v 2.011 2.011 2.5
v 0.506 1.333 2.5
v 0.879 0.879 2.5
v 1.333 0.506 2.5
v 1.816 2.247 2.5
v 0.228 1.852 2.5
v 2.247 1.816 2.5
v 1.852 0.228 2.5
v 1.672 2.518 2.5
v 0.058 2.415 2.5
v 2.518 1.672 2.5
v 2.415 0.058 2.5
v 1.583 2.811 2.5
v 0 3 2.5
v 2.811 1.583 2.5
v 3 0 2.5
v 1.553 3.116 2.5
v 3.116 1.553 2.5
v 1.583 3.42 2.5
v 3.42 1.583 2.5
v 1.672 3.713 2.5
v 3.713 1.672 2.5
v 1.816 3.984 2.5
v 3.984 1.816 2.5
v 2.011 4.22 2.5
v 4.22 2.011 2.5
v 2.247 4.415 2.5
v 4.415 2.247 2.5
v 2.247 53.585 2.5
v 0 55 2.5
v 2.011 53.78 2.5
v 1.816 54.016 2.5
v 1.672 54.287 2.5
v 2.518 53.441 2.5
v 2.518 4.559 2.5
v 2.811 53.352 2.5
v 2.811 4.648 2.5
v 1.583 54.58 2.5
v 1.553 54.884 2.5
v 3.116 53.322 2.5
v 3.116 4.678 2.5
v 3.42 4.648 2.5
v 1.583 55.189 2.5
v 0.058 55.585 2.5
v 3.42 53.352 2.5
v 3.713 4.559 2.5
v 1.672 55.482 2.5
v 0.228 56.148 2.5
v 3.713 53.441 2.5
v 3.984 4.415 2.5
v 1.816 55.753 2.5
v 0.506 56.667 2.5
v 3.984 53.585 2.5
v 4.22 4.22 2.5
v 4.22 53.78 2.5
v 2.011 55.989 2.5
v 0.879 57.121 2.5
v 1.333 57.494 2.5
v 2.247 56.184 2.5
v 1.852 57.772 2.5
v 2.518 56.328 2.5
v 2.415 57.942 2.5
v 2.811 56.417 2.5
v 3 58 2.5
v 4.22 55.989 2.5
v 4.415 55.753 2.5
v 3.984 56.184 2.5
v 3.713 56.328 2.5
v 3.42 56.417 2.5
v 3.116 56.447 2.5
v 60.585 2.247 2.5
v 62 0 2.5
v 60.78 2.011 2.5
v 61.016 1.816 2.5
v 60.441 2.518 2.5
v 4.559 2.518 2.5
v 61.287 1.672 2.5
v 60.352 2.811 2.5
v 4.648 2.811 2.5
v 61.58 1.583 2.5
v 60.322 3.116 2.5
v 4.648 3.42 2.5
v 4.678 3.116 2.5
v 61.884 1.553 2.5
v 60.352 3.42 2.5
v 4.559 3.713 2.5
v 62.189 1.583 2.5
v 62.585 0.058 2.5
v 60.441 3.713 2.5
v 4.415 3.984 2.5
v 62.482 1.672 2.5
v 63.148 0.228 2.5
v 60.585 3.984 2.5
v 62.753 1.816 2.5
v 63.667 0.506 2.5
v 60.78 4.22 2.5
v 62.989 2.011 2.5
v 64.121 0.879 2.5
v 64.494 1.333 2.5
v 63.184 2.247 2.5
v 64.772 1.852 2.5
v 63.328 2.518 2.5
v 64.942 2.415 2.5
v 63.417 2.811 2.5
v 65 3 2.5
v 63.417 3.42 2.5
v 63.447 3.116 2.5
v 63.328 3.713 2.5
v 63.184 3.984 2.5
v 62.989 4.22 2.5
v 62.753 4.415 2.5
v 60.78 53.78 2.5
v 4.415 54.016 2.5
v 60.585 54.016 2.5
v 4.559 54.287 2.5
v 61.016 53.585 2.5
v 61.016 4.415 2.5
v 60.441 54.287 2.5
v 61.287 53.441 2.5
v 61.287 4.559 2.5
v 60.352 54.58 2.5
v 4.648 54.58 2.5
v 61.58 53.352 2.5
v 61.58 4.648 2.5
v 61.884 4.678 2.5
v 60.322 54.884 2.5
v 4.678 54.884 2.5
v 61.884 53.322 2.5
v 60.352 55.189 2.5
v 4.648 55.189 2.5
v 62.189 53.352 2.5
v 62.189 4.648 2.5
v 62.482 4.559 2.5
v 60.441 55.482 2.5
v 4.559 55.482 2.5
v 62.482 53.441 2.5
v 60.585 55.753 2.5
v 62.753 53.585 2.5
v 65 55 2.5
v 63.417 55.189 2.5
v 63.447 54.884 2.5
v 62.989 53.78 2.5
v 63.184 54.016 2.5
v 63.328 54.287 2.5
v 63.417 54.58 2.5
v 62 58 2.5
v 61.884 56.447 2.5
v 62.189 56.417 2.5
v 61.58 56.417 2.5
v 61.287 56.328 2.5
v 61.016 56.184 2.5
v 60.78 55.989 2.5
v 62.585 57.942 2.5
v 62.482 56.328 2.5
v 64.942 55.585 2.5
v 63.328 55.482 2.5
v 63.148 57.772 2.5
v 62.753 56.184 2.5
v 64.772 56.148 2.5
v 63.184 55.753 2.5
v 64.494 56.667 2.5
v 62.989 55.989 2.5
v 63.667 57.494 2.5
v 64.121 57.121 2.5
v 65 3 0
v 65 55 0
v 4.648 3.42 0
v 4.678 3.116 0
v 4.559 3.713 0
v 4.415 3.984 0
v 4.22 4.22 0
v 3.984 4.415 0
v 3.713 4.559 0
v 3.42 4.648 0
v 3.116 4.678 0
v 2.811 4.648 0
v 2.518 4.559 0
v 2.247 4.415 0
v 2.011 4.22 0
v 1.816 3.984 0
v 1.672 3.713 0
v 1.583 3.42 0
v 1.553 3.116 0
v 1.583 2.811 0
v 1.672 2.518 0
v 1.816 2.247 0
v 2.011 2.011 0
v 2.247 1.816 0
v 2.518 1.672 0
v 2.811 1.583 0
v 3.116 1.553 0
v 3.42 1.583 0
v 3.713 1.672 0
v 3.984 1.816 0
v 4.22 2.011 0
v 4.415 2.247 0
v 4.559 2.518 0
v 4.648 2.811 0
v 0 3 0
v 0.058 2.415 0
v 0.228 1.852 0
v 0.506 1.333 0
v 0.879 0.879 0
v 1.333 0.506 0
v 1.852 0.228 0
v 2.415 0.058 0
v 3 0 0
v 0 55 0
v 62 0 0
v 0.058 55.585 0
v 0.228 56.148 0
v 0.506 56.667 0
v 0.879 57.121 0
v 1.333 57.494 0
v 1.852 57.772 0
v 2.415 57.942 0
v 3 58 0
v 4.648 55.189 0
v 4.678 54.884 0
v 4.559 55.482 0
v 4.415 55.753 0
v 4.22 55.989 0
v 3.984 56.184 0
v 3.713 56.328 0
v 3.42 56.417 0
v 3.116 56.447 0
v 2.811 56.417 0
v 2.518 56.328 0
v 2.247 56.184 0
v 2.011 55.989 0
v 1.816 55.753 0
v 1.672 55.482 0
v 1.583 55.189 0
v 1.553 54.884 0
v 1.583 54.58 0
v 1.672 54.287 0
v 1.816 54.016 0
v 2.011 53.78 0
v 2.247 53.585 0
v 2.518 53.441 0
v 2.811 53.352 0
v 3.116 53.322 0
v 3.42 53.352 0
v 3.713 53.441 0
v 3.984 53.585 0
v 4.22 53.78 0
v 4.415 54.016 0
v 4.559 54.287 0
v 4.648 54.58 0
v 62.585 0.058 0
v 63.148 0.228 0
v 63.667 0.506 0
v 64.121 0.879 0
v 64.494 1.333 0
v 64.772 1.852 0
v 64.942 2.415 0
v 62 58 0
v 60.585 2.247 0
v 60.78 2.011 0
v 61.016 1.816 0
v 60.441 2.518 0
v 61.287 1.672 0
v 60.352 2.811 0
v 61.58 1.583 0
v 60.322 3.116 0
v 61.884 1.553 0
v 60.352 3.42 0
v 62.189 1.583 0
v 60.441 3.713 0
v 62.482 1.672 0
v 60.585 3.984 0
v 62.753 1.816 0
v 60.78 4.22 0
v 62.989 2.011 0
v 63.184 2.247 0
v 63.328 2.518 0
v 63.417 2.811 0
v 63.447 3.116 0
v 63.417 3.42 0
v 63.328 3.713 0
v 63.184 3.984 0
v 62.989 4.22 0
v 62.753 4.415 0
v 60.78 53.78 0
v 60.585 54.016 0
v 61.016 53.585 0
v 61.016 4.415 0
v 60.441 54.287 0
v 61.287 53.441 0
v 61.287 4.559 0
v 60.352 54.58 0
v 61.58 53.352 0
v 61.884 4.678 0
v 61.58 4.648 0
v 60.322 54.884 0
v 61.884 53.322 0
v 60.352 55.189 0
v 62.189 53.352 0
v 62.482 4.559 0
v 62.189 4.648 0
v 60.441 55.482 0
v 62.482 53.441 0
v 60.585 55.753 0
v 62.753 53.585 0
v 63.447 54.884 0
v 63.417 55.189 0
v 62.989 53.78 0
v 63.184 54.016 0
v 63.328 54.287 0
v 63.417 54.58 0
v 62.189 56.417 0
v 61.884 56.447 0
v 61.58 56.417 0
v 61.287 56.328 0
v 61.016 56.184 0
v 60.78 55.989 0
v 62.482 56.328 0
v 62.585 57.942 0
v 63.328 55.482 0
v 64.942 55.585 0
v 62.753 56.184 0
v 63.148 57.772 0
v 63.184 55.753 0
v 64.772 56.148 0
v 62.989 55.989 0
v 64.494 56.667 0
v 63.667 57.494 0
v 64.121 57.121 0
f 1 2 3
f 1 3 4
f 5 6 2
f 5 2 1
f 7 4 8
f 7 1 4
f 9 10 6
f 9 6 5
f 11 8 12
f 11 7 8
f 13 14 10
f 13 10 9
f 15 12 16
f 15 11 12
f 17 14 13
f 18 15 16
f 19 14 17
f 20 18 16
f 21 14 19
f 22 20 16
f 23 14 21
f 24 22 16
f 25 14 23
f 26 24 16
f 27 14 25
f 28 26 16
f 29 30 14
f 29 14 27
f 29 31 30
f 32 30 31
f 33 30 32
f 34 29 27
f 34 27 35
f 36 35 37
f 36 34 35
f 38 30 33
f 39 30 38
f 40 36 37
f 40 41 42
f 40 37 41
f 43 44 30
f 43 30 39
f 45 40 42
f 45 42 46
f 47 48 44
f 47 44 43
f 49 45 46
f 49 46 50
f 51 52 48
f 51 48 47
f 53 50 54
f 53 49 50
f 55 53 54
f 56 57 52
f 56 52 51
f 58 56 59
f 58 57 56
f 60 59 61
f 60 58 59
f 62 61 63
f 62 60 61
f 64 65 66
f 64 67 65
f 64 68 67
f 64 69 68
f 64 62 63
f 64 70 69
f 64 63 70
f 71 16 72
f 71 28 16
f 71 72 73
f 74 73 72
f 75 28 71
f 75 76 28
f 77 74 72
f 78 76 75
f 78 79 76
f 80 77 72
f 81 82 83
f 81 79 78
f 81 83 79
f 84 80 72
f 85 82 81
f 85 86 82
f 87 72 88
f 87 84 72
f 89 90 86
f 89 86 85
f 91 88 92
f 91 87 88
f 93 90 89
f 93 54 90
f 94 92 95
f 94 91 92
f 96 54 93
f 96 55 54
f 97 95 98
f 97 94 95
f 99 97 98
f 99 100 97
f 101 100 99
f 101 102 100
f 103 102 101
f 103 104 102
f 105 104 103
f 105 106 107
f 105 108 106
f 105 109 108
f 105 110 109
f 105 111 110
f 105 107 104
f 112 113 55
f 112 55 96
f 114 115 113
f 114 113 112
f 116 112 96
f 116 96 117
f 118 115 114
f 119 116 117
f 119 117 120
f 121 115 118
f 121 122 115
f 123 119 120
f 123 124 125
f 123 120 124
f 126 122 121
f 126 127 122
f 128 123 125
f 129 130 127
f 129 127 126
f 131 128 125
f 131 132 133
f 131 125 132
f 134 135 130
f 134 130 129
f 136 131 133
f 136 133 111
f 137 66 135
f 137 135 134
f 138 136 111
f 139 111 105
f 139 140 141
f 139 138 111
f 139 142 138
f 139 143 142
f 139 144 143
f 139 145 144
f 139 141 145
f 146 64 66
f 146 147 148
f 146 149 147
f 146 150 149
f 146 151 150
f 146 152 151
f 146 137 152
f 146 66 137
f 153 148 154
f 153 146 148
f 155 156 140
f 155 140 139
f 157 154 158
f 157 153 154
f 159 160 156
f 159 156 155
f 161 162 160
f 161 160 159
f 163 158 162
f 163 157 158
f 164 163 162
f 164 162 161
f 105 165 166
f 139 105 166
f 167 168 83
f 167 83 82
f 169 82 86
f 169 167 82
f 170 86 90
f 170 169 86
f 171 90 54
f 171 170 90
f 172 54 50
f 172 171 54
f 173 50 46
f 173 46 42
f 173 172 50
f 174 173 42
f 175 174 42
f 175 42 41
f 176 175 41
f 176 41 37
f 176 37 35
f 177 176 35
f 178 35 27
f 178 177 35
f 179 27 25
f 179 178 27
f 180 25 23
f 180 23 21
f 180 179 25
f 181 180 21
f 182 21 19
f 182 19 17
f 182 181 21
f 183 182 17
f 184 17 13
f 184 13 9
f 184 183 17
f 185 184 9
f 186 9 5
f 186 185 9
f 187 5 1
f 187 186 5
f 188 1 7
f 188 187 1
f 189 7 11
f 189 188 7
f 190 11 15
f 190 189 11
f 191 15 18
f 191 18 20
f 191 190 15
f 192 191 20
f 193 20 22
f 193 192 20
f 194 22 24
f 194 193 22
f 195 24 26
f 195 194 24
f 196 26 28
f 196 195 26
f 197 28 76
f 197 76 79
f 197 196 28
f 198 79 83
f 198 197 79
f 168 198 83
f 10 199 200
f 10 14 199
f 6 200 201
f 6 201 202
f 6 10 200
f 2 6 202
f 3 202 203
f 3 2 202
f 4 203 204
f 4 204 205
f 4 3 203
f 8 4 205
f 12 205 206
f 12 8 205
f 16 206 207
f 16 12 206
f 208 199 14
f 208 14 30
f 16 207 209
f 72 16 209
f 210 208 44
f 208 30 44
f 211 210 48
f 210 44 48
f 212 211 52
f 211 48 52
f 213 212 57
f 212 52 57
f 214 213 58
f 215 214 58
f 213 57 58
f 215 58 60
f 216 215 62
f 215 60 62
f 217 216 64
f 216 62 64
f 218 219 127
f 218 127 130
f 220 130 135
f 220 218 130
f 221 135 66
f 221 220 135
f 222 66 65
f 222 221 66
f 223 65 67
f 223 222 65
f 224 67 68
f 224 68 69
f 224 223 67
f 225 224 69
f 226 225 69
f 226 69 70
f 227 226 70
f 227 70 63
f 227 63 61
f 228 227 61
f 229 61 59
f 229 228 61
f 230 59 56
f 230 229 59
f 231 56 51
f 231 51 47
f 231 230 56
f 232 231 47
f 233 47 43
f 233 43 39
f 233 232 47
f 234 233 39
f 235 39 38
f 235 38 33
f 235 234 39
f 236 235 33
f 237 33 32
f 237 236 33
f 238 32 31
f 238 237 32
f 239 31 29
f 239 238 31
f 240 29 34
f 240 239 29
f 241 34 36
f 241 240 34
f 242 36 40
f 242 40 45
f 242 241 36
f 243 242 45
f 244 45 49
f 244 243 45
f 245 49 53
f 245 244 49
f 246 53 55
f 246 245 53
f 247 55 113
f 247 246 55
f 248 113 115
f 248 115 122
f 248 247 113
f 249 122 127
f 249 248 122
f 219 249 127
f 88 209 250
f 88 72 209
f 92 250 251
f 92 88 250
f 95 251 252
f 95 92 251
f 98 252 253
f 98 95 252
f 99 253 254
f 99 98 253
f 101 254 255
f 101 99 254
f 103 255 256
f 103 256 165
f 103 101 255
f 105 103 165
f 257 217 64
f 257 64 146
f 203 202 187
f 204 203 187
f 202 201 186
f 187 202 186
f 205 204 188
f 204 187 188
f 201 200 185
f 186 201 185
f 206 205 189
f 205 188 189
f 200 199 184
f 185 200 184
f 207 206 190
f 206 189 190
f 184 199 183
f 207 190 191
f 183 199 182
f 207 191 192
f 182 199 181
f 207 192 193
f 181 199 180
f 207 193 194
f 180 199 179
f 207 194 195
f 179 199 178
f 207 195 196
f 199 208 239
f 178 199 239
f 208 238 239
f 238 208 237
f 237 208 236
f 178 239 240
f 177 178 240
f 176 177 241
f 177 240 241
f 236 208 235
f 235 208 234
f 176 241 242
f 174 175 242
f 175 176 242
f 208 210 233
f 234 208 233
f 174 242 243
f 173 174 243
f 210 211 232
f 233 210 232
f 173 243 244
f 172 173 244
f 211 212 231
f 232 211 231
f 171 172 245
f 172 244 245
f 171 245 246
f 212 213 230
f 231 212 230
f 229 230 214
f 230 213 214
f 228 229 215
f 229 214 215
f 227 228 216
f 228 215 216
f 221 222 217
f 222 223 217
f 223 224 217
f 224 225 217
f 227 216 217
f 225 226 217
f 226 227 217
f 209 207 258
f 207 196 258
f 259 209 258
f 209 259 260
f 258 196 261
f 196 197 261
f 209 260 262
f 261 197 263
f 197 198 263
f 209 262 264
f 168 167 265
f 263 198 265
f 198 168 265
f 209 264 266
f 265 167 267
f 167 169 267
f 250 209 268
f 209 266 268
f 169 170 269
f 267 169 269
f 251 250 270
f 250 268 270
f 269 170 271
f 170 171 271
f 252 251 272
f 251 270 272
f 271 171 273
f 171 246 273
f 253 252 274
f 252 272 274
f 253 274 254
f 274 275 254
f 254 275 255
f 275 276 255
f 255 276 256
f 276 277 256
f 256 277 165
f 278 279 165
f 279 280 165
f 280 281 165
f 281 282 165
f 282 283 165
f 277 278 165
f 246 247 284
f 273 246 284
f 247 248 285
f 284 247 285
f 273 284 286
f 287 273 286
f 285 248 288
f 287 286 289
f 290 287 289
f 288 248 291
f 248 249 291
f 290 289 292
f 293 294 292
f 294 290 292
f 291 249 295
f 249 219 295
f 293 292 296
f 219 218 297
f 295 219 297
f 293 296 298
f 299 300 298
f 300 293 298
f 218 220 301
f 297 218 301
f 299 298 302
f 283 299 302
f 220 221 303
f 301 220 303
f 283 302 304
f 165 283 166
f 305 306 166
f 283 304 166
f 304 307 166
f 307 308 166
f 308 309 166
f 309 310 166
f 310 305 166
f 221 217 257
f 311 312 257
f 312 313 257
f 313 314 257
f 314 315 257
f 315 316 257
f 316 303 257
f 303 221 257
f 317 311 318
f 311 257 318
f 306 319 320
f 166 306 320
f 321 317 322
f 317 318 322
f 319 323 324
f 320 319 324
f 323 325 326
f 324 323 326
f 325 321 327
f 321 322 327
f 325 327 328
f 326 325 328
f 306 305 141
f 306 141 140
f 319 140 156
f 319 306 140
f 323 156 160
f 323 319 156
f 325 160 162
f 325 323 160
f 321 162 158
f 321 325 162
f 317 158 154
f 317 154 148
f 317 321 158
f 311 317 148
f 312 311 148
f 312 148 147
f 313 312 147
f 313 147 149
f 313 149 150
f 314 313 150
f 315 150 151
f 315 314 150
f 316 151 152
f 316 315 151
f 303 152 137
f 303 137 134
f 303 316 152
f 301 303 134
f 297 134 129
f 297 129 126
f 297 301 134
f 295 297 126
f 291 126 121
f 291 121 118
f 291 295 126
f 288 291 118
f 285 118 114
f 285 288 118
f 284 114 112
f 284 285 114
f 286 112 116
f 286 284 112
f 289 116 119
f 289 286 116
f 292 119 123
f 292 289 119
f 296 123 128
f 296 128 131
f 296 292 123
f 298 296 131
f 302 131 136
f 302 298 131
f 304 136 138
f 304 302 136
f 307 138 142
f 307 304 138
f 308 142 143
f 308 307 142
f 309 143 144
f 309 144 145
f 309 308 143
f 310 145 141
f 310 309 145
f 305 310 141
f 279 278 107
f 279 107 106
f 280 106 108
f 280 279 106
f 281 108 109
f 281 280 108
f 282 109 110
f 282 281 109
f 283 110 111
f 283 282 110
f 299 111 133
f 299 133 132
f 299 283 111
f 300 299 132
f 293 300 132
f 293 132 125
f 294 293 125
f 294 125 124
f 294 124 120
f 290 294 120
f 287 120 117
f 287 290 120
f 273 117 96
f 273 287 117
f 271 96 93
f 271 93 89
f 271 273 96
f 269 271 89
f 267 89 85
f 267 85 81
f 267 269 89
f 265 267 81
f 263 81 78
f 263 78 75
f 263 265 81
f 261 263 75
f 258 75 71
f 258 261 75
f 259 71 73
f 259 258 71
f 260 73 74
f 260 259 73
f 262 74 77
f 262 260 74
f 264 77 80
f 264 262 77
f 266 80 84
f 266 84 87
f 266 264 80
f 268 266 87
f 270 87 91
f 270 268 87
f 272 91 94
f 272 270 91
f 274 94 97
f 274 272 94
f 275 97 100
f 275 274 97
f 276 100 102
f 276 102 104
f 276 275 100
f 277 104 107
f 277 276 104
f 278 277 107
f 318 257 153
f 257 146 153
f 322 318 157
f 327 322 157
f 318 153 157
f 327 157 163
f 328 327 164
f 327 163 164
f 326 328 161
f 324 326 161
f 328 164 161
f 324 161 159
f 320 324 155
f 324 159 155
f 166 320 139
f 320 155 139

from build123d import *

# Parameters (mm, degrees)
BASE_SKETCH_W       = 65
BASE_SKETCH_H       = 58
BOSS_EXTRUDE2_DEPTH = 2.5
MOUNTING_HOLES_R    = 1.56250005
MOUNTING_HOLES_R_2  = 1.5625
CUT_EXTRUDE5_DEPTH  = 2.5
FILLET1_R           = 3


with BuildPart() as part:
    # Base Sketch → Boss-Extrude2 (new body)
    with BuildSketch(Plane.XY):
        with Locations((32.5, 29)):
            Rectangle(BASE_SKETCH_W, BASE_SKETCH_H)
    extrude(amount=BOSS_EXTRUDE2_DEPTH)

    # Mounting Holes → Cut-Extrude5 (cut)
    with BuildSketch(Plane.XY):
        with Locations((3.115503651, 54.884496349)):
            Circle(MOUNTING_HOLES_R)
        with Locations((61.884496349, 54.884496349)):
            Circle(MOUNTING_HOLES_R)
        with Locations((61.884496349, 3.115503651)):
            Circle(MOUNTING_HOLES_R)
        with Locations((3.115503651, 3.115503651)):
            Circle(MOUNTING_HOLES_R_2)
    extrude(amount=CUT_EXTRUDE5_DEPTH, mode=Mode.SUBTRACT)

    # Fillet1
    fillet1_edges = [part.edges().sort_by_distance(p)[0] for p in [
        (0, 0, 1.25),
        (0, 58, 1.25),
        (65, 58, 1.25),
        (65, 0, 1.25),
    ]]
    fillet(fillet1_edges, radius=FILLET1_R)


solid = part.part
